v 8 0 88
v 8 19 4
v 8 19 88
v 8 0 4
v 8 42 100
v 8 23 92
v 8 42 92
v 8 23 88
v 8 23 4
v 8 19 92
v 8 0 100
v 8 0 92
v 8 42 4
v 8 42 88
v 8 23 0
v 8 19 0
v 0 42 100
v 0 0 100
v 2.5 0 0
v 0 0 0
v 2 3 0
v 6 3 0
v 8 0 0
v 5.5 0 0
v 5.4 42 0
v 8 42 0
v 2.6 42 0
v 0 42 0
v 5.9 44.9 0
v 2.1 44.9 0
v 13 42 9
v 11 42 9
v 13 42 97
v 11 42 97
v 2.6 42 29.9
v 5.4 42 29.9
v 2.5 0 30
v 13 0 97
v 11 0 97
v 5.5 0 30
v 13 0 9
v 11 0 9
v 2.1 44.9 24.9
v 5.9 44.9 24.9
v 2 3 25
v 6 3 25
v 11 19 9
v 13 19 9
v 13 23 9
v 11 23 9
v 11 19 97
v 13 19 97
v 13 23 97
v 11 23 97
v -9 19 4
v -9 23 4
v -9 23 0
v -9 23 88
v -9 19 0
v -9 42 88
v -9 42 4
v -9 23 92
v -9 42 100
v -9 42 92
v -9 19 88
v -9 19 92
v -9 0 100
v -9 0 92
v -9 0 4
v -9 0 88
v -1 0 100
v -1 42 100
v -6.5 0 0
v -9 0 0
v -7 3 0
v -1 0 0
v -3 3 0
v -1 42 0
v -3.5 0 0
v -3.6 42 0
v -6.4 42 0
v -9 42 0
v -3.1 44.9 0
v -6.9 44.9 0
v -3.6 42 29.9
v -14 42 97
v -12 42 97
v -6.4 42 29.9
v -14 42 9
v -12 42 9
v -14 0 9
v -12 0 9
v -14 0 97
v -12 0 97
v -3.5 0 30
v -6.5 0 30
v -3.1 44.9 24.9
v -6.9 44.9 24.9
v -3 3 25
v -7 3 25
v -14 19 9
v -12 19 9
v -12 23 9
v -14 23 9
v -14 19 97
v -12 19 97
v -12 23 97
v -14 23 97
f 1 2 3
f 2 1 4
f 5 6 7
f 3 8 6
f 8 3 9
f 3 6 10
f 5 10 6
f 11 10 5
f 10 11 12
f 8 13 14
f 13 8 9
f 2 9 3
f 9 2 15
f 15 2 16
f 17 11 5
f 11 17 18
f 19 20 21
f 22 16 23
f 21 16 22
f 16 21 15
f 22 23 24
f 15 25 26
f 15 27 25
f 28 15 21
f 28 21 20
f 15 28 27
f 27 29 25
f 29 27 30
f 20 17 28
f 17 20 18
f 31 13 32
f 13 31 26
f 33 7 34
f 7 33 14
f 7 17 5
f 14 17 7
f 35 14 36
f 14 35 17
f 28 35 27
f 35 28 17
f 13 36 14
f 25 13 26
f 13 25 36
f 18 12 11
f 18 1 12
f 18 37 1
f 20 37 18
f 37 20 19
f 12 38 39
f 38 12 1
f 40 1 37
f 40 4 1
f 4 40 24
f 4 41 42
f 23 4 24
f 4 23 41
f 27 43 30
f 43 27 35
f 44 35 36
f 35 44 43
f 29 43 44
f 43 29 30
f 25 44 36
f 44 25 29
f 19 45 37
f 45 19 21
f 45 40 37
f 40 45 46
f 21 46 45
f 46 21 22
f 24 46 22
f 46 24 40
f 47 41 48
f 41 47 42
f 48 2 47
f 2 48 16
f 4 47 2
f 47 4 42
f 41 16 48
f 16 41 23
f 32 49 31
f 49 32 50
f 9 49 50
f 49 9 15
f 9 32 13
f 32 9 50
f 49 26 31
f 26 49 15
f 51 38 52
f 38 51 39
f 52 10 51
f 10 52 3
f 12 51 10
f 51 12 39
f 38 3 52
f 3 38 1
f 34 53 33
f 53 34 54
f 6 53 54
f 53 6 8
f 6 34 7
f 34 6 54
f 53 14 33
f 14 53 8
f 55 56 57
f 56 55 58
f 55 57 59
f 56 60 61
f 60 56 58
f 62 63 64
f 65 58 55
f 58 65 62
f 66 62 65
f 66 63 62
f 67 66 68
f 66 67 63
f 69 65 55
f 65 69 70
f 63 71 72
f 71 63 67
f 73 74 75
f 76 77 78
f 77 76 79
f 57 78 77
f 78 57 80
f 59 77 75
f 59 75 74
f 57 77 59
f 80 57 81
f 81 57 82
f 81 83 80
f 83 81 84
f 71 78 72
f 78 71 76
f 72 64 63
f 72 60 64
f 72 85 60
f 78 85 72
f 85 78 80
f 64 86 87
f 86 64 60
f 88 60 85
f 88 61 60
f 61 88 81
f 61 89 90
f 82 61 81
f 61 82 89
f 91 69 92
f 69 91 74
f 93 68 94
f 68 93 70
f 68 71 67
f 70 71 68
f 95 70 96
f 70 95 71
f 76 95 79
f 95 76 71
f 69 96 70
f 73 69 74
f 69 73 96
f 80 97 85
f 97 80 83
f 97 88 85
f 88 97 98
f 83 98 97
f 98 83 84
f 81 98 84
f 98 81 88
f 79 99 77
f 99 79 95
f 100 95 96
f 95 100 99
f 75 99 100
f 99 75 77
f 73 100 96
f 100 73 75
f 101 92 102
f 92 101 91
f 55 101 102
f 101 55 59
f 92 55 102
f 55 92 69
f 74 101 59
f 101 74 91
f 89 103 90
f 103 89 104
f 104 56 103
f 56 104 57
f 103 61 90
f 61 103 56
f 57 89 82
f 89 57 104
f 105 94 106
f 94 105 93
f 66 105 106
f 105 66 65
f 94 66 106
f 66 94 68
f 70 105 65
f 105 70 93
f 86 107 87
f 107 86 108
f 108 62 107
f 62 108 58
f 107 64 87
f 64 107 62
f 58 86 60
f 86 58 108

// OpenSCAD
// file: constants.scad
// Copyright Ian G. Clifton 2026
// Apache 2.0 license
// https://github.com/IanGClifton/modular-paint-stack

GRIDFINITY_DIMENSION = 42;
CIRCLE_RESOLUTION = 100;

SHELF_SUPPORT_WIDTH = 3;
SHELF_SUPPORT_BLOCK_PROTRUSION = 9;
SHELF_SUPPORT_BLOCK_X = 3;
SHELF_SUPPORT_BLOCK_Y = 4;
SHELF_SUPPORT_ANGLE_X = 3;
SHELF_SUPPORT_ANGLE_Y = (GRIDFINITY_DIMENSION - SHELF_SUPPORT_BLOCK_Y) / 2;
SHELF_SUPPORT_ANGLE_PROTRUSION = 4.9;
SHELF_SUPPORT_SPACING = 2;
SHELF_SUPPORT_ANGLE_CUT = 0.4;

SHELF_THICKNESS = 3;
SHELF_MIN_BACK_RAIL = 8;

SIDE_X = 8;
SIDE_Y = GRIDFINITY_DIMENSION;

DOVETAIL_XMIN = 3.0;
DOVETAIL_XMAX = 4.0;
DOVETAIL_YDEPTH = 3.0;
DOVETAIL_ZDIFF = 5.0;
DOVETAIL_ZMAX = 30.0;
DOVETAIL_ZMIN = DOVETAIL_ZMAX - DOVETAIL_ZDIFF;
DOVETAIL_OFFSET = (SIDE_X / 2) - (DOVETAIL_XMAX / 2);

SHELF_BRACKET_WIDTH = 2;
SHELF_BRACKET_OPENING_HEIGHT = 5;
SHELF_BRACKET_OPENING_WIDTH = 3;
SHELF_BRACKET_CONNECTION_HEIGHT = 4;
SHELF_BRACKET_Y_DEPTH = 19;
SHELF_BRACKET_Y_GAP = 4;

CUTOUT_SHAPE_NONE = 0;
CUTOUT_SHAPE_OVAL = 1;
CUTOUT_SHAPE_RECTANGLE = 2;
CUTOUT_SHAPE_ANGLED_RECTANGLE = 3;

function getShelfMainWidth(gridfinityUnits) = GRIDFINITY_DIMENSION * gridfinityUnits;

function getShelfFullWidth(gridfinityUnits) = (SHELF_SUPPORT_WIDTH * 2) + getShelfMainWidth(gridfinityUnits);
// file: dovetail.scad
// Copyright Ian G. Clifton 2026
// Apache 2.0 license
// https://github.com/IanGClifton/modular-paint-stack

include <constants.scad>

/**
  * Creates the dovetail shape for connecting pieces
  *
  * Top view
  * ____
  * \__/
  *
  * Side view
  * 
  * |\
  * | \
  * |  |
  * |  |
  * |  |
  * |__|
  *
  * xMin thinnest part of the x dimension where the dovetail connects
  * xMax thickest part of the x dimension on the outside of the dovetail
  * yDepth how far out the dovetail protrudes
  * zMin lowest part of the height/z dimension
  * zMax highest part of the height/z dimension
  * inset how much to "shrink" the dovetail for fitting in another piece
  */
module dovetail(xMin, xMax, yDepth, zMin, zMax, inset = 0) {
    points = [
        // Base
        [0 + inset, yDepth - inset, 0],               // 0 TL
        [xMax - inset, yDepth - inset, 0],            // 1 TR
        [((xMax - xMin) / 2) + inset, 0, 0],          // 2 BL
        [(((xMax - xMin) / 2) + xMin) - inset, 0, 0], // 3 BR
        // Top
        [0 + inset, yDepth - inset, zMin - inset],              // 4 TL
        [xMax - inset, yDepth - inset, zMin - inset],           // 5 TR
        [((xMax - xMin) / 2) + inset, 0, zMax - inset],         // 6 BL
        [(((xMax - xMin) / 2) + xMin) - inset, 0, zMax - inset] // 7 BR
    ];
    
    faces = [
        [0, 2, 3, 1], // Bottom
        [4, 5, 7, 6], // Top
        [6, 7, 3, 2], // Front
        [4, 6, 2, 0], // Left
        [4, 0, 1, 5], // Back
        [7, 5, 1, 3], // Right
        
    ];
    polyhedron(points, faces);
}

/**
 * Creates a dovetail using the default constants
 */
module dovetailDefault(inset = 0) {
    dovetail(
        xMin = DOVETAIL_XMIN,
        xMax = DOVETAIL_XMAX,
        yDepth = DOVETAIL_YDEPTH,
        zMin = DOVETAIL_ZMIN,
        zMax = DOVETAIL_ZMAX,
        inset = inset
    );
}

module dovetailSlot(height) {
    difference() {
        cube([SIDE_X, DOVETAIL_YDEPTH, height]);
        rotate([0, 0, 180]) {
            translate([-DOVETAIL_XMAX - DOVETAIL_OFFSET, -DOVETAIL_YDEPTH, 0]) {
                dovetailDefault();
            }
        }
    }
}
// main file
// Copyright Ian G. Clifton 2026
// Apache 2.0 license
// https://github.com/IanGClifton/modular-paint-stack

// mm from 30 to printer max Z dimension
side_height = 100;
// mm offset to make the dovetail fit (0.05 = extremely tight, 0.10 = tight)
dovetail_clearance = 0.10;
// True to add brackets for a shelf on the top
shelf_brackets_on_top = true;
// True to add brackets for a shelf on the bottom
shelf_brackets_on_bottom = true;
// How many mm to raise the bottom backets
shelf_brackets_bottom_offset = 0;

include <dovetail.scad>

/**
  * Creates a side with dovetails but no brackets
  */
module sideWithDovetail() {
    difference() {
        union() {
            cube([SIDE_X, SIDE_Y, side_height]);
            translate([(SIDE_X / 2) - (DOVETAIL_XMAX / 2), SIDE_Y, 0])
                dovetail(
                    xMin = DOVETAIL_XMIN,
                    xMax = DOVETAIL_XMAX,
                    yDepth = DOVETAIL_YDEPTH,
                    zMin = DOVETAIL_ZMIN,
                    zMax = DOVETAIL_ZMAX,
                    inset = dovetail_clearance
                );
                
        }
        translate([(SIDE_X / 2) - (DOVETAIL_XMAX / 2), 0, 0])
            dovetail(
                xMin = DOVETAIL_XMIN,
                xMax = DOVETAIL_XMAX,
                yDepth = DOVETAIL_YDEPTH,
                zMin = DOVETAIL_ZMIN,
                zMax = DOVETAIL_ZMAX
            );
    }
}

/**
  * Creates a single shelf backet
  *
  * Side view
  *
  * |  __
  * | / / 
  * |/ /
  * | /
  * |/
  * |
  *
  */
module shelfBracketSingle(width, openingWidth, openingHeight, connectionHeight, yDepth) {
    insideRight = openingWidth;
    outsideRight = width + openingWidth;
    top = openingHeight + connectionHeight;
    points = [
        // Front
        [insideRight, 0, top],    // 0 TL
        [outsideRight, 0, top],   // 1 TR
        [0, 0, connectionHeight], // 2 top connection
        [0, 0, 0],                // 3 bottom connection
        
        // Back
        [insideRight, yDepth, top],    // 4 TL
        [outsideRight, yDepth, top],   // 5 TR
        [0, yDepth, connectionHeight], // 6 top connection
        [0, yDepth, 0],                // 7 bottom connection
        
    ];
    faces = [
        [0, 1, 3, 2], // Front
        [0, 2, 6, 4], // Left angle
        [2, 3, 7, 6], // Left flat
        [4, 6, 7, 5], // Back
        [1, 5, 7, 3], // Right
        [4, 5, 1, 0], // Top
    ];
    polyhedron(points, faces);
}

/**
  * Creates a pair of shelf brackets
  */
module shelfBracketPair(width, openingWidth, openingHeight, connectionHeight, yDepth, yGap) {
    shelfBracketSingle(
        width = width,
        openingWidth = openingWidth,
        openingHeight = openingHeight,
        connectionHeight = connectionHeight,
        yDepth = yDepth
    );
    translate([0, yGap + yDepth, 0])
        shelfBracketSingle(
            width = width,
            openingWidth = openingWidth,
            openingHeight = openingHeight,
            connectionHeight = connectionHeight,
            yDepth = yDepth
        );
}

// Helper to just use the defaults
module shelfBrackets() {
    shelfBracketPair(
        width = SHELF_BRACKET_WIDTH,
        openingWidth = SHELF_BRACKET_OPENING_WIDTH,
        openingHeight = SHELF_BRACKET_OPENING_HEIGHT,
        connectionHeight = SHELF_BRACKET_CONNECTION_HEIGHT,
        yDepth = SHELF_BRACKET_Y_DEPTH,
        yGap = SHELF_BRACKET_Y_GAP
    );    
}

function getVerticalOffsetForShelfAtHeight(height) =
    height - SHELF_BRACKET_OPENING_HEIGHT - SHELF_BRACKET_CONNECTION_HEIGHT - SHELF_THICKNESS;

/**
  * Creates the complete left side with side, dovetails, and brackets
  */
module leftSide() {
    union() {
        sideWithDovetail();
        if (shelf_brackets_on_bottom) {
            translate([SIDE_X, 0, shelf_brackets_bottom_offset])
                shelfBrackets();
        }
        if (shelf_brackets_on_top) {
            translate([SIDE_X, 0, getVerticalOffsetForShelfAtHeight(side_height)])
                shelfBrackets();
        }
    }
}

/**
  * Mirrors the left side and offsets it -1 unit
  *
  * Visually, this might seem wrong (the right gets added to the left)
  * but this is to maximize printing efficiency since the bulk of the
  * print will be two tall rectangles next to each other.
  */
module rightSide() {
    translate([-1, 0, 0])
        mirror([1, 0, 0])
            leftSide();
}

leftSide();
rightSide();
